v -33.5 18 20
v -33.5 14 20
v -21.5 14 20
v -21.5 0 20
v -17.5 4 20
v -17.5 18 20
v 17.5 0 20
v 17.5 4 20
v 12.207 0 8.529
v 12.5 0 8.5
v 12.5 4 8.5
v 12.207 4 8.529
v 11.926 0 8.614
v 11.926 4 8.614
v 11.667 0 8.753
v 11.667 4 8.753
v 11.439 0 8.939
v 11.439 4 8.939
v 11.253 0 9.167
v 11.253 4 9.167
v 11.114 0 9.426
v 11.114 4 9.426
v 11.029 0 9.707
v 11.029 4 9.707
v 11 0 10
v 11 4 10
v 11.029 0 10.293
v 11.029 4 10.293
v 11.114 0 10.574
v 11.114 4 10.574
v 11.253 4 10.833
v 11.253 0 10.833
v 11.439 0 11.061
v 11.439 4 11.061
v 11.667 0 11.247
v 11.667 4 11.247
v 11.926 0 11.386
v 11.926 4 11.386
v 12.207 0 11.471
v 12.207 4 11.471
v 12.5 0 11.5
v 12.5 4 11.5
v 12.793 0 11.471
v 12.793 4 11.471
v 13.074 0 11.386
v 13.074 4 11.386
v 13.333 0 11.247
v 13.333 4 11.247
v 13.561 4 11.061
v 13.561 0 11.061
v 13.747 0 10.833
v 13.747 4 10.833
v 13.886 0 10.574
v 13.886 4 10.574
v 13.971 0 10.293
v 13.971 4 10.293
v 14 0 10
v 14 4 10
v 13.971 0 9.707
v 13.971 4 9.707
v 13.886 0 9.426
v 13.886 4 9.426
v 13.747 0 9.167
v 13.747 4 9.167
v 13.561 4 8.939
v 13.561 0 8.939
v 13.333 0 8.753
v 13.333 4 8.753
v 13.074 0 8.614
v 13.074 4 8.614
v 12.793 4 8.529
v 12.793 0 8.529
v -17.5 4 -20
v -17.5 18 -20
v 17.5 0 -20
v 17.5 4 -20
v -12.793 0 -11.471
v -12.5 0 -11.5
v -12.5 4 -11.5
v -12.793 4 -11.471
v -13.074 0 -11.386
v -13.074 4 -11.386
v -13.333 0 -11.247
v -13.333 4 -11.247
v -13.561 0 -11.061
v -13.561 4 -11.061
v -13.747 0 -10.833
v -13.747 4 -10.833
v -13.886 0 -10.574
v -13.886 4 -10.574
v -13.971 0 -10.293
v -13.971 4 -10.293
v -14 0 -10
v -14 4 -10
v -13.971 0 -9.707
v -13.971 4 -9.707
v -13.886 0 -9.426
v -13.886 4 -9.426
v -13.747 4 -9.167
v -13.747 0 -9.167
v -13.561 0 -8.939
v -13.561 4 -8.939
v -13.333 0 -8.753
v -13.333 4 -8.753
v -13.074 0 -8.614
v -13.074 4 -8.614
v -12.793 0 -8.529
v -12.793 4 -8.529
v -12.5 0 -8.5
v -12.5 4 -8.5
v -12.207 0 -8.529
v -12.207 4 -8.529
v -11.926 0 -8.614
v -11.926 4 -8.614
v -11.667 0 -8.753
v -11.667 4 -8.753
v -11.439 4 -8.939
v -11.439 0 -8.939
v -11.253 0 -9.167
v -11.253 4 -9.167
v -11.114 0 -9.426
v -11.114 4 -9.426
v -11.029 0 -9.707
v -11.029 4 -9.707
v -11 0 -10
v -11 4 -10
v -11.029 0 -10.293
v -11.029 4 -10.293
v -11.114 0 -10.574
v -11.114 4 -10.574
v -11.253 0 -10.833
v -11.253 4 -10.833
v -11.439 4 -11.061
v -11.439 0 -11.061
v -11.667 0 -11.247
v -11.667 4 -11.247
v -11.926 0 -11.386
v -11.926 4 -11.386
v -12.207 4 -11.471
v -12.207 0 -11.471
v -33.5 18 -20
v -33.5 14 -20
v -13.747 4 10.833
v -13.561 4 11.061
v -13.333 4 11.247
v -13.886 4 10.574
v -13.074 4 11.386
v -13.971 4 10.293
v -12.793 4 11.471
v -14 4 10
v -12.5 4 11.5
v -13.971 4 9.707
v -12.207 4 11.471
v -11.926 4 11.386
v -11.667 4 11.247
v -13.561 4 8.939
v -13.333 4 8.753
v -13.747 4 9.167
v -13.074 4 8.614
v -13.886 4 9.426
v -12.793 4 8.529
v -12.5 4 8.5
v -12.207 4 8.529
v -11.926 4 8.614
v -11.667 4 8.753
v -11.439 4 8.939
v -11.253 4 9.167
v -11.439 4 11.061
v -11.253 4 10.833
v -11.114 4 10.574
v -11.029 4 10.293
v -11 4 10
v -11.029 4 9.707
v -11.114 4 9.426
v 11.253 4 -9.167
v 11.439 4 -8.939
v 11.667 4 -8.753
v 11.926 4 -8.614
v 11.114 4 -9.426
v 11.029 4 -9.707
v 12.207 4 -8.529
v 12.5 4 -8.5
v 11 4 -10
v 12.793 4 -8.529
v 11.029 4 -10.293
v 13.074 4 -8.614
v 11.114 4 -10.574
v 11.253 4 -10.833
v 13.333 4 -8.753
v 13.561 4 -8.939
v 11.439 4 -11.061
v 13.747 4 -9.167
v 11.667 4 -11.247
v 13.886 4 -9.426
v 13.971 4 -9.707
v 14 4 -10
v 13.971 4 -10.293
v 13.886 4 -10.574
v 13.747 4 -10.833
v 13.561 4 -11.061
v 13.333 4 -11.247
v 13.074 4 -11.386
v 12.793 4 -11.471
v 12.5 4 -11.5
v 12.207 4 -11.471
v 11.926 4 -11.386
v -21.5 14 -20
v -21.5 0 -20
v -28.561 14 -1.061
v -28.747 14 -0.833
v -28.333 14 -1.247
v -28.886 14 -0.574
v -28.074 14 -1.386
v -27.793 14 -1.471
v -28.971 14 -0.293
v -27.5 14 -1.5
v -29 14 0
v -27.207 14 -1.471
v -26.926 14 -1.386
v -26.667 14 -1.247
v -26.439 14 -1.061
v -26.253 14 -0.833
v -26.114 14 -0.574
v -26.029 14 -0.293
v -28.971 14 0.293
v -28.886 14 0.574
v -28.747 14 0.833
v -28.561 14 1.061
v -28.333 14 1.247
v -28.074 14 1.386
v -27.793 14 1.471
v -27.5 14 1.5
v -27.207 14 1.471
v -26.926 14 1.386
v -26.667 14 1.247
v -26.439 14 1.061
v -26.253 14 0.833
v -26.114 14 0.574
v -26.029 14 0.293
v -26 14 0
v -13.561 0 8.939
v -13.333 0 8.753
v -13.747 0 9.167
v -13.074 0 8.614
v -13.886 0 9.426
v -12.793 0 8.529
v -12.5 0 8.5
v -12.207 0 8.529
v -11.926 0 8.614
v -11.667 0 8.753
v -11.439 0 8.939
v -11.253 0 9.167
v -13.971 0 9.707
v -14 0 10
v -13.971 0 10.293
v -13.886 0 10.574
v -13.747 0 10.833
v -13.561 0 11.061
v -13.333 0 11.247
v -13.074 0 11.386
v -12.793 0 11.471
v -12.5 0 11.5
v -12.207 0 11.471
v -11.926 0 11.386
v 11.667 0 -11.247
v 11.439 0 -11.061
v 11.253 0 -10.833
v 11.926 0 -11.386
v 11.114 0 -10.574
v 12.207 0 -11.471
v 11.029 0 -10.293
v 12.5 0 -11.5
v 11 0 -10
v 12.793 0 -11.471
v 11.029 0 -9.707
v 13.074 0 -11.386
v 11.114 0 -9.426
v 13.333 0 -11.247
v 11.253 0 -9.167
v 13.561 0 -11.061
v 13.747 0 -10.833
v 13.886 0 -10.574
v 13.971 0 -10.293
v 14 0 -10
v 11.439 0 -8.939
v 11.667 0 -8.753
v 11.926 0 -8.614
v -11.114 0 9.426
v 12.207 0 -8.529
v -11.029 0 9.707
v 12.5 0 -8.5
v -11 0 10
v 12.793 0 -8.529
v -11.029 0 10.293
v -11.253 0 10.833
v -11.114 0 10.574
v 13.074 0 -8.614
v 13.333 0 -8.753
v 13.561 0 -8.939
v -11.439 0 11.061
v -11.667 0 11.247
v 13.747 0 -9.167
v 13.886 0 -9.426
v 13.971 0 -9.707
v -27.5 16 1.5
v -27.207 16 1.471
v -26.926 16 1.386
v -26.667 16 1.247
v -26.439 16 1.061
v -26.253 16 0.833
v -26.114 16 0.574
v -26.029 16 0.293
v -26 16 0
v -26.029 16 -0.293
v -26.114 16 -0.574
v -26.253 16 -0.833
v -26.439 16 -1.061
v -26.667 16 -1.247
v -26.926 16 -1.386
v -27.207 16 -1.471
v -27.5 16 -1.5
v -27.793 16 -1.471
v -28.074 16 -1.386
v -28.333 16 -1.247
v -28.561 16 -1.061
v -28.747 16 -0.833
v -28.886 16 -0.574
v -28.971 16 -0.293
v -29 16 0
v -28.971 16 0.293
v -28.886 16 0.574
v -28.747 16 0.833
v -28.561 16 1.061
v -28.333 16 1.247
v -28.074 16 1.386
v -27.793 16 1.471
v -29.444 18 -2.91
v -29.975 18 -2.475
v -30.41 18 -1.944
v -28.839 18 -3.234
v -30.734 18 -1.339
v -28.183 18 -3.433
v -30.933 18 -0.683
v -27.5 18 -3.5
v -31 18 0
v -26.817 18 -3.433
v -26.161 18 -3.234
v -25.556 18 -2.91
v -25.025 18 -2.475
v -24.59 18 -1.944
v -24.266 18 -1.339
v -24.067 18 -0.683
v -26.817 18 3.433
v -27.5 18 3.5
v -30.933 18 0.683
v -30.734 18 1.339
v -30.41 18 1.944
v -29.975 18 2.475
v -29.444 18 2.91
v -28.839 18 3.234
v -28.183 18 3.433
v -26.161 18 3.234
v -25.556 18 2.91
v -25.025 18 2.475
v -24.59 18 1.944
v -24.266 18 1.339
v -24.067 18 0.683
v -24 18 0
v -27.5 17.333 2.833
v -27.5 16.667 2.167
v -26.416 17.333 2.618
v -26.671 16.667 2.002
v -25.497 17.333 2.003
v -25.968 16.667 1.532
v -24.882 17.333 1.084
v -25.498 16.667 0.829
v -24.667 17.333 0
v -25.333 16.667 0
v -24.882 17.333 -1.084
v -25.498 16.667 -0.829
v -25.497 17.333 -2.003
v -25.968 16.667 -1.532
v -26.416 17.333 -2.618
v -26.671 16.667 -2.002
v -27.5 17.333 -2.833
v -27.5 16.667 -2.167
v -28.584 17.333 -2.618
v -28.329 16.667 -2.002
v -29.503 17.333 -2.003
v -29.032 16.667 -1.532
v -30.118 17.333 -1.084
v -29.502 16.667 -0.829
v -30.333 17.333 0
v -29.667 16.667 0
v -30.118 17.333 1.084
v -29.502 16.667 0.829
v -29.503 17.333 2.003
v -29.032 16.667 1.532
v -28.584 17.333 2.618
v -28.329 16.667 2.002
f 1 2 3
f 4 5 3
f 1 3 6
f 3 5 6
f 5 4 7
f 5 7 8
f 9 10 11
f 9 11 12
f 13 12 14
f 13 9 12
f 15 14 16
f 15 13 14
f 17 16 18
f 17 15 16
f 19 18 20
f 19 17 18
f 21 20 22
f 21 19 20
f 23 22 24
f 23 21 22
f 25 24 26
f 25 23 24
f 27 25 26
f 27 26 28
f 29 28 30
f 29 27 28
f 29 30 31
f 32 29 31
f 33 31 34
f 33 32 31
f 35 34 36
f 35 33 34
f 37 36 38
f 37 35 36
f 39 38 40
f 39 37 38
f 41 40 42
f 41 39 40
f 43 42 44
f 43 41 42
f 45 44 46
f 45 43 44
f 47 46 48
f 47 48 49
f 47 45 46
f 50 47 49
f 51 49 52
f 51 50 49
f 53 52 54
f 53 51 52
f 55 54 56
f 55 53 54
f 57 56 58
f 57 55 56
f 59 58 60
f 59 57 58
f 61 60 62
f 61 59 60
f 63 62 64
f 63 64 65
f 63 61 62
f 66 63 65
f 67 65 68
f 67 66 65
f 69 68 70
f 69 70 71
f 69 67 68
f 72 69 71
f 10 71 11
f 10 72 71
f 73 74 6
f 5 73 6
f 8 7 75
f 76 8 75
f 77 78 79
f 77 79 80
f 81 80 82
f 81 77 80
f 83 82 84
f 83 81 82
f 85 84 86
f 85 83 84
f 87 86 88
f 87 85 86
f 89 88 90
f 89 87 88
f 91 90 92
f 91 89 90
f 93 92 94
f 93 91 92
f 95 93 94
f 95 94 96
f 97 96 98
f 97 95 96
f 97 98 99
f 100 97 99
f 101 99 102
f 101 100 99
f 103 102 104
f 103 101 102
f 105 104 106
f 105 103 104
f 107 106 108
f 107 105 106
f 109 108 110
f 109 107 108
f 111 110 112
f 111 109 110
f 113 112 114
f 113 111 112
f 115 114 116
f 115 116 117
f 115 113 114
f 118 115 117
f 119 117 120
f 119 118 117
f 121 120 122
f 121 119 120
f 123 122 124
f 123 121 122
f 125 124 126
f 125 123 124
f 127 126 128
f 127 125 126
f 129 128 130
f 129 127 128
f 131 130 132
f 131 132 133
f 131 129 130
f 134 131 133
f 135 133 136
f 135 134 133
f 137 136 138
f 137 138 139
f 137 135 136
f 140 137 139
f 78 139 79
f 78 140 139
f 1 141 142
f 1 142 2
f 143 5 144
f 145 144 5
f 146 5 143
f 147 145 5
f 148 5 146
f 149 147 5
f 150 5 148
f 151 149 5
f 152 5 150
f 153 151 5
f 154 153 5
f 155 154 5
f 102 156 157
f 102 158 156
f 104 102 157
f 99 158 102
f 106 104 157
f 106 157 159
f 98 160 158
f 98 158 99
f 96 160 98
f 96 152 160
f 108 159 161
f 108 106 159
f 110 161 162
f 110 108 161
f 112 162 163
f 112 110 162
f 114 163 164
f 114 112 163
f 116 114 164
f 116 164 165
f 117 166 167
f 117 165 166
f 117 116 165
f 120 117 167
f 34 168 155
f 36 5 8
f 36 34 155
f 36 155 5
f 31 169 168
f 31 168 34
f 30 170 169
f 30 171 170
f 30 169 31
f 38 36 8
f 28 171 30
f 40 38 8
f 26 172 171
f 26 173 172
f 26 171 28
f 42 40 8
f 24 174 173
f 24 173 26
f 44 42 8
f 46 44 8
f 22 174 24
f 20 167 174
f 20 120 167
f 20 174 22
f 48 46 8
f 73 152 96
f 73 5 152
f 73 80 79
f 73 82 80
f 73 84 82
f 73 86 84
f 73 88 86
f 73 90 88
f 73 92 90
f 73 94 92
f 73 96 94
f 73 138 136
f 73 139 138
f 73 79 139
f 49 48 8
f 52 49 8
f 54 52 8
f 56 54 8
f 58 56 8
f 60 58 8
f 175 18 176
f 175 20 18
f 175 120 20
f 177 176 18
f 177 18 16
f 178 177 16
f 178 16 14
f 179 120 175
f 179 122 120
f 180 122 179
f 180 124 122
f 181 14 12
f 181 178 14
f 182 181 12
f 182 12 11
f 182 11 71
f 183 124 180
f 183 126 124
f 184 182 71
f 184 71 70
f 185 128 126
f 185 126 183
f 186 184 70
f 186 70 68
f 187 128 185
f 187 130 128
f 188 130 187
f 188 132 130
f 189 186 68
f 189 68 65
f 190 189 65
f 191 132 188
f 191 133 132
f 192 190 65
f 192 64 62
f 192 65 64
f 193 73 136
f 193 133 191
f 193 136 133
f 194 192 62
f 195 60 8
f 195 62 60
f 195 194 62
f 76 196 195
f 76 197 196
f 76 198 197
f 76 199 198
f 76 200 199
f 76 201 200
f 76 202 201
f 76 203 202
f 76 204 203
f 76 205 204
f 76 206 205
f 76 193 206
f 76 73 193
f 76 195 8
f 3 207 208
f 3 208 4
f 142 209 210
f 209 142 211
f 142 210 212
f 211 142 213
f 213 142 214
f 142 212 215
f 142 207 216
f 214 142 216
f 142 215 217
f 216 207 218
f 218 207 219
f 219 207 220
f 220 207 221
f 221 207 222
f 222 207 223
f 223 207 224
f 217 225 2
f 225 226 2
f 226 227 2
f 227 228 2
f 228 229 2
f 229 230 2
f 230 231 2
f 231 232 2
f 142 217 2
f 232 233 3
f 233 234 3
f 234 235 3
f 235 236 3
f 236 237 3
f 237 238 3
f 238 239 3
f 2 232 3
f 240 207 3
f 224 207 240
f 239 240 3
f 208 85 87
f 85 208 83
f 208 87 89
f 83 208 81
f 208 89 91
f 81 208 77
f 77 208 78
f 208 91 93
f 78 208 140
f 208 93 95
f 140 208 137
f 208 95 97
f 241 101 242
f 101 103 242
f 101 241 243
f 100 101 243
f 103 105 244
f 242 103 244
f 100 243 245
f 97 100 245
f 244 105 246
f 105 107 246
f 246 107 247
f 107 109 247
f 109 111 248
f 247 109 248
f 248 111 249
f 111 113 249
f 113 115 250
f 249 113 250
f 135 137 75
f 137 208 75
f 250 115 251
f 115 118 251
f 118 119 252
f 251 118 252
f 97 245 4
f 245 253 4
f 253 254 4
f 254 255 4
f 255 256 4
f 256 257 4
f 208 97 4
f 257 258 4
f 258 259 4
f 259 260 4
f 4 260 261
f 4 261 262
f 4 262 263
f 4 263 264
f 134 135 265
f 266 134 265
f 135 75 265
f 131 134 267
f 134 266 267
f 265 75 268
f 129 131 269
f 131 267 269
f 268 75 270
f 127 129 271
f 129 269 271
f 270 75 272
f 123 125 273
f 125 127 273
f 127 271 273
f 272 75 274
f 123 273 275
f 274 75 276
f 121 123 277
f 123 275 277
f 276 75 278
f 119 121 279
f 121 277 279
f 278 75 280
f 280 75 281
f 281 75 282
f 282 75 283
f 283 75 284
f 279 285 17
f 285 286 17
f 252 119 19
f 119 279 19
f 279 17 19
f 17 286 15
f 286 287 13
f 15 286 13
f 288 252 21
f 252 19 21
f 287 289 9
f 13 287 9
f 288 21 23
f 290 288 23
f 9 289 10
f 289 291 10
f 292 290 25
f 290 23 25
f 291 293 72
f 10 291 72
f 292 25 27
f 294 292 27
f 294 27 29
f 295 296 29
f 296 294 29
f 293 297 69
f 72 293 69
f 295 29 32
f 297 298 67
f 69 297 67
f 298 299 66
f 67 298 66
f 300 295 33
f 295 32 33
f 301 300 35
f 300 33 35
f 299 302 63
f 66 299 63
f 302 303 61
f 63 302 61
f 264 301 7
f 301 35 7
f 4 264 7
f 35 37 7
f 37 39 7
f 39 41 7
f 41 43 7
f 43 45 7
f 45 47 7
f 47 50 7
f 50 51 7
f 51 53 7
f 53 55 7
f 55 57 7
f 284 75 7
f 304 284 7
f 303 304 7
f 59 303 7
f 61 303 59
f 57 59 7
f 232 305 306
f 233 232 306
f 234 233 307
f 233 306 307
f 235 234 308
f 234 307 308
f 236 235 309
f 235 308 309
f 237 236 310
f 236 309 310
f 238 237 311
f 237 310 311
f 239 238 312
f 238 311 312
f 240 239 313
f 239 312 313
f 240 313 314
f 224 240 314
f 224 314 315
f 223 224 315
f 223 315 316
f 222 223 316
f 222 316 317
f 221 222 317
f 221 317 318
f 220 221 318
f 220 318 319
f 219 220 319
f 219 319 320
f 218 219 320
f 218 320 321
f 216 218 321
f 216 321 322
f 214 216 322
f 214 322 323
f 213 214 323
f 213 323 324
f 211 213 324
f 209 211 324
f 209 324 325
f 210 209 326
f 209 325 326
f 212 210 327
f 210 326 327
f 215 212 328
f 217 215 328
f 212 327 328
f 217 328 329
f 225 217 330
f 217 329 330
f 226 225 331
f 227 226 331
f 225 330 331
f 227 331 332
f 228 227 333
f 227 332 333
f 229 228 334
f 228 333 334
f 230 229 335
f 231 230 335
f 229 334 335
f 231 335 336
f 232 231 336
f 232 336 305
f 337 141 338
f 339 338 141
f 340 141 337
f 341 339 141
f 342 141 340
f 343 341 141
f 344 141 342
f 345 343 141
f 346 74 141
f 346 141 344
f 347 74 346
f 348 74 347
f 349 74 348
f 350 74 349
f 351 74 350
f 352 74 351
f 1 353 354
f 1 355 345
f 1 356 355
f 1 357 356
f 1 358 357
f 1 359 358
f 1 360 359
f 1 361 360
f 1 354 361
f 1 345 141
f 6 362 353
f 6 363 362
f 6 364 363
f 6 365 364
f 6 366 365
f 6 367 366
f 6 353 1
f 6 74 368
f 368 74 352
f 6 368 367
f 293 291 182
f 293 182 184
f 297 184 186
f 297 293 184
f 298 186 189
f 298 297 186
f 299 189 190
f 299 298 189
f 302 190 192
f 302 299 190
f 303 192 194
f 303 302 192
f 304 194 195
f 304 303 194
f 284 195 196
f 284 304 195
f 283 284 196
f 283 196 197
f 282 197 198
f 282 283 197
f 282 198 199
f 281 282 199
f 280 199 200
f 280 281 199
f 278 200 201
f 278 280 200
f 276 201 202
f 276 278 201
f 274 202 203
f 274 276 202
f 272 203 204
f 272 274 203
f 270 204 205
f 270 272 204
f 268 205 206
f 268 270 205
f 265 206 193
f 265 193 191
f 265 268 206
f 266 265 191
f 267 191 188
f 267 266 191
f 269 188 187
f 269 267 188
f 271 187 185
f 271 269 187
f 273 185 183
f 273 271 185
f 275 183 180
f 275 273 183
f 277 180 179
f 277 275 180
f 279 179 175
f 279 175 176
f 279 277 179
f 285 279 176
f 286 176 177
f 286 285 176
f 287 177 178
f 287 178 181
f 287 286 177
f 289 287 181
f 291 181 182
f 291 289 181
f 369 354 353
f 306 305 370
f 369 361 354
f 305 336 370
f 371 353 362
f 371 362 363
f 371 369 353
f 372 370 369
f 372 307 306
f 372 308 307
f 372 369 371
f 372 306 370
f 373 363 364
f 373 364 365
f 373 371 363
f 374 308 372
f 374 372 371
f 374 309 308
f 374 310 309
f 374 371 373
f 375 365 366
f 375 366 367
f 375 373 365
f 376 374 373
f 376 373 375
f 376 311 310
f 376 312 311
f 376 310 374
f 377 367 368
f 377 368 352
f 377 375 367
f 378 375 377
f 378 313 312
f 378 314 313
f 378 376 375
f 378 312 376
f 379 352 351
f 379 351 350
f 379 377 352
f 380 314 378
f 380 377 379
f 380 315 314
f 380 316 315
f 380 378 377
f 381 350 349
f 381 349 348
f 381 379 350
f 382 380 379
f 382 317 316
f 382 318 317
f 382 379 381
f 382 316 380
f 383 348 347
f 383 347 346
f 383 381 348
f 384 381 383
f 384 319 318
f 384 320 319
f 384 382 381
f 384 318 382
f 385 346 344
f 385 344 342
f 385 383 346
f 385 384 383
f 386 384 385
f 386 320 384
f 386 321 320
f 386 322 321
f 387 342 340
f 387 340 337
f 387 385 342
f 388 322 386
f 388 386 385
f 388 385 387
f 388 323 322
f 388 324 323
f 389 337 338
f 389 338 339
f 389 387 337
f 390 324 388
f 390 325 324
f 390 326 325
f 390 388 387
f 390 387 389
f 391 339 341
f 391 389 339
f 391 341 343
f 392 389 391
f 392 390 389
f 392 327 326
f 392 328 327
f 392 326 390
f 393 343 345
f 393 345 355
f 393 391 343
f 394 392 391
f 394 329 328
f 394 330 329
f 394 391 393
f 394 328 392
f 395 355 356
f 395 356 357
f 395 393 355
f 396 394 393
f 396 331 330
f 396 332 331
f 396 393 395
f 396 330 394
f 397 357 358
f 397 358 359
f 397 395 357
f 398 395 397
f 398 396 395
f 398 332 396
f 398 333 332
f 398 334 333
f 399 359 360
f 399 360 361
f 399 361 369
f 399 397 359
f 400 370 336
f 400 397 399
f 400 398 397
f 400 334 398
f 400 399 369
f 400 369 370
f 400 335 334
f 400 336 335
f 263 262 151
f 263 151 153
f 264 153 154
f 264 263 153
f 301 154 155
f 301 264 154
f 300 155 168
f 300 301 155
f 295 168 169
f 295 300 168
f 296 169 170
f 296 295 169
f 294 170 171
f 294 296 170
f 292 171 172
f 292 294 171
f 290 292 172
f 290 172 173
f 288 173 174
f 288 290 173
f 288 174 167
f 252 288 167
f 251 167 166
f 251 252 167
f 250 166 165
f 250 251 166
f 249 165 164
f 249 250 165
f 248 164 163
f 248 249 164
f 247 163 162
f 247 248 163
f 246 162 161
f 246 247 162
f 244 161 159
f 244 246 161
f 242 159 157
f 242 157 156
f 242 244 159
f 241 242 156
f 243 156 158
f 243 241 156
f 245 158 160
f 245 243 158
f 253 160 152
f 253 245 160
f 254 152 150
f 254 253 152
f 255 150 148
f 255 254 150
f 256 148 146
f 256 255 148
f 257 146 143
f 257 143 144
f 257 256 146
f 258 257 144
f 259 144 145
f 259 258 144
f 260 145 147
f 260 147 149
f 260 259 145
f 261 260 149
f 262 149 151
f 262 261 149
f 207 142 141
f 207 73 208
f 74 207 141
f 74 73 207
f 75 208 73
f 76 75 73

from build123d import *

# Parameters (mm, degrees)
SKETCH_1_W          = 35
SKETCH_1_H          = 40
SKETCH_1_R          = 1.5
EXTRUDE_1_DEPTH     = 4
SKETCH_2_W          = 40
SKETCH_2_H          = 18
EXTRUDE_2_DEPTH     = 4
SKETCH_3_W          = 40
SKETCH_3_H          = 4
EXTRUDE_3_DEPTH     = 12
CUT_EXTRUDE_1_REACH = 44.968
SKETCH_4_R          = 1.5
CHAMFER_1_SIZE      = 2


with BuildPart() as part:
    # 草图1 → 凸台-拉伸1 (new body)
    with BuildSketch(Plane(origin=(0, 0, 0), x_dir=(1, 0, 0), z_dir=(0, 1, 0))):
        Rectangle(SKETCH_1_W, SKETCH_1_H)
        with Locations(Location((12.5, 10, 0), (0, 0, 270))):
            Circle(SKETCH_1_R, mode=Mode.SUBTRACT)
        with Locations(Location((-12.5, 10, 0), (0, 0, 90))):
            Circle(SKETCH_1_R, mode=Mode.SUBTRACT)
        with Locations(Location((-12.5, -10, 0), (0, 0, 270))):
            Circle(SKETCH_1_R, mode=Mode.SUBTRACT)
        with Locations(Location((12.5, -10, 0), (0, 0, 90))):
            Circle(SKETCH_1_R, mode=Mode.SUBTRACT)
    extrude(amount=EXTRUDE_1_DEPTH)

    # 草图2 → 凸台-拉伸2 (add)
    with BuildSketch(Plane.ZY.offset(17.5)):
        with Locations((0, 9)):
            Rectangle(SKETCH_2_W, SKETCH_2_H)
    extrude(amount=EXTRUDE_2_DEPTH)

    # 草图3 → 凸台-拉伸3 (add)
    with BuildSketch(Plane.ZY.offset(21.5)):
        with Locations((0, 16)):
            Rectangle(SKETCH_3_W, SKETCH_3_H)
    extrude(amount=EXTRUDE_3_DEPTH)

    # 草图4 → 切除-拉伸1 (cut, up to next)
    with BuildSketch(Plane(origin=(0, 18, 0), x_dir=(1, 0, 0), z_dir=(0, 1, 0)), mode=Mode.PRIVATE) as cut_extrude_1_sk1:
        with Locations(Location((-27.5, 0, 0), (0, 0, 270))):
            Circle(SKETCH_4_R)
    cut_extrude_1_tool1 = extrude(cut_extrude_1_sk1.sketch, amount=-CUT_EXTRUDE_1_REACH, mode=Mode.PRIVATE) & part.part
    add(cut_extrude_1_tool1.solids().sort_by_distance((-27.5, 18, 0))[0], mode=Mode.SUBTRACT)

    # 倒角1
    chamfer_1_edges = [part.edges().sort_by_distance(p)[0] for p in [
        (-27.5, 18, -1.5),
    ]]
    chamfer(chamfer_1_edges, length=CHAMFER_1_SIZE)


solid = part.part
